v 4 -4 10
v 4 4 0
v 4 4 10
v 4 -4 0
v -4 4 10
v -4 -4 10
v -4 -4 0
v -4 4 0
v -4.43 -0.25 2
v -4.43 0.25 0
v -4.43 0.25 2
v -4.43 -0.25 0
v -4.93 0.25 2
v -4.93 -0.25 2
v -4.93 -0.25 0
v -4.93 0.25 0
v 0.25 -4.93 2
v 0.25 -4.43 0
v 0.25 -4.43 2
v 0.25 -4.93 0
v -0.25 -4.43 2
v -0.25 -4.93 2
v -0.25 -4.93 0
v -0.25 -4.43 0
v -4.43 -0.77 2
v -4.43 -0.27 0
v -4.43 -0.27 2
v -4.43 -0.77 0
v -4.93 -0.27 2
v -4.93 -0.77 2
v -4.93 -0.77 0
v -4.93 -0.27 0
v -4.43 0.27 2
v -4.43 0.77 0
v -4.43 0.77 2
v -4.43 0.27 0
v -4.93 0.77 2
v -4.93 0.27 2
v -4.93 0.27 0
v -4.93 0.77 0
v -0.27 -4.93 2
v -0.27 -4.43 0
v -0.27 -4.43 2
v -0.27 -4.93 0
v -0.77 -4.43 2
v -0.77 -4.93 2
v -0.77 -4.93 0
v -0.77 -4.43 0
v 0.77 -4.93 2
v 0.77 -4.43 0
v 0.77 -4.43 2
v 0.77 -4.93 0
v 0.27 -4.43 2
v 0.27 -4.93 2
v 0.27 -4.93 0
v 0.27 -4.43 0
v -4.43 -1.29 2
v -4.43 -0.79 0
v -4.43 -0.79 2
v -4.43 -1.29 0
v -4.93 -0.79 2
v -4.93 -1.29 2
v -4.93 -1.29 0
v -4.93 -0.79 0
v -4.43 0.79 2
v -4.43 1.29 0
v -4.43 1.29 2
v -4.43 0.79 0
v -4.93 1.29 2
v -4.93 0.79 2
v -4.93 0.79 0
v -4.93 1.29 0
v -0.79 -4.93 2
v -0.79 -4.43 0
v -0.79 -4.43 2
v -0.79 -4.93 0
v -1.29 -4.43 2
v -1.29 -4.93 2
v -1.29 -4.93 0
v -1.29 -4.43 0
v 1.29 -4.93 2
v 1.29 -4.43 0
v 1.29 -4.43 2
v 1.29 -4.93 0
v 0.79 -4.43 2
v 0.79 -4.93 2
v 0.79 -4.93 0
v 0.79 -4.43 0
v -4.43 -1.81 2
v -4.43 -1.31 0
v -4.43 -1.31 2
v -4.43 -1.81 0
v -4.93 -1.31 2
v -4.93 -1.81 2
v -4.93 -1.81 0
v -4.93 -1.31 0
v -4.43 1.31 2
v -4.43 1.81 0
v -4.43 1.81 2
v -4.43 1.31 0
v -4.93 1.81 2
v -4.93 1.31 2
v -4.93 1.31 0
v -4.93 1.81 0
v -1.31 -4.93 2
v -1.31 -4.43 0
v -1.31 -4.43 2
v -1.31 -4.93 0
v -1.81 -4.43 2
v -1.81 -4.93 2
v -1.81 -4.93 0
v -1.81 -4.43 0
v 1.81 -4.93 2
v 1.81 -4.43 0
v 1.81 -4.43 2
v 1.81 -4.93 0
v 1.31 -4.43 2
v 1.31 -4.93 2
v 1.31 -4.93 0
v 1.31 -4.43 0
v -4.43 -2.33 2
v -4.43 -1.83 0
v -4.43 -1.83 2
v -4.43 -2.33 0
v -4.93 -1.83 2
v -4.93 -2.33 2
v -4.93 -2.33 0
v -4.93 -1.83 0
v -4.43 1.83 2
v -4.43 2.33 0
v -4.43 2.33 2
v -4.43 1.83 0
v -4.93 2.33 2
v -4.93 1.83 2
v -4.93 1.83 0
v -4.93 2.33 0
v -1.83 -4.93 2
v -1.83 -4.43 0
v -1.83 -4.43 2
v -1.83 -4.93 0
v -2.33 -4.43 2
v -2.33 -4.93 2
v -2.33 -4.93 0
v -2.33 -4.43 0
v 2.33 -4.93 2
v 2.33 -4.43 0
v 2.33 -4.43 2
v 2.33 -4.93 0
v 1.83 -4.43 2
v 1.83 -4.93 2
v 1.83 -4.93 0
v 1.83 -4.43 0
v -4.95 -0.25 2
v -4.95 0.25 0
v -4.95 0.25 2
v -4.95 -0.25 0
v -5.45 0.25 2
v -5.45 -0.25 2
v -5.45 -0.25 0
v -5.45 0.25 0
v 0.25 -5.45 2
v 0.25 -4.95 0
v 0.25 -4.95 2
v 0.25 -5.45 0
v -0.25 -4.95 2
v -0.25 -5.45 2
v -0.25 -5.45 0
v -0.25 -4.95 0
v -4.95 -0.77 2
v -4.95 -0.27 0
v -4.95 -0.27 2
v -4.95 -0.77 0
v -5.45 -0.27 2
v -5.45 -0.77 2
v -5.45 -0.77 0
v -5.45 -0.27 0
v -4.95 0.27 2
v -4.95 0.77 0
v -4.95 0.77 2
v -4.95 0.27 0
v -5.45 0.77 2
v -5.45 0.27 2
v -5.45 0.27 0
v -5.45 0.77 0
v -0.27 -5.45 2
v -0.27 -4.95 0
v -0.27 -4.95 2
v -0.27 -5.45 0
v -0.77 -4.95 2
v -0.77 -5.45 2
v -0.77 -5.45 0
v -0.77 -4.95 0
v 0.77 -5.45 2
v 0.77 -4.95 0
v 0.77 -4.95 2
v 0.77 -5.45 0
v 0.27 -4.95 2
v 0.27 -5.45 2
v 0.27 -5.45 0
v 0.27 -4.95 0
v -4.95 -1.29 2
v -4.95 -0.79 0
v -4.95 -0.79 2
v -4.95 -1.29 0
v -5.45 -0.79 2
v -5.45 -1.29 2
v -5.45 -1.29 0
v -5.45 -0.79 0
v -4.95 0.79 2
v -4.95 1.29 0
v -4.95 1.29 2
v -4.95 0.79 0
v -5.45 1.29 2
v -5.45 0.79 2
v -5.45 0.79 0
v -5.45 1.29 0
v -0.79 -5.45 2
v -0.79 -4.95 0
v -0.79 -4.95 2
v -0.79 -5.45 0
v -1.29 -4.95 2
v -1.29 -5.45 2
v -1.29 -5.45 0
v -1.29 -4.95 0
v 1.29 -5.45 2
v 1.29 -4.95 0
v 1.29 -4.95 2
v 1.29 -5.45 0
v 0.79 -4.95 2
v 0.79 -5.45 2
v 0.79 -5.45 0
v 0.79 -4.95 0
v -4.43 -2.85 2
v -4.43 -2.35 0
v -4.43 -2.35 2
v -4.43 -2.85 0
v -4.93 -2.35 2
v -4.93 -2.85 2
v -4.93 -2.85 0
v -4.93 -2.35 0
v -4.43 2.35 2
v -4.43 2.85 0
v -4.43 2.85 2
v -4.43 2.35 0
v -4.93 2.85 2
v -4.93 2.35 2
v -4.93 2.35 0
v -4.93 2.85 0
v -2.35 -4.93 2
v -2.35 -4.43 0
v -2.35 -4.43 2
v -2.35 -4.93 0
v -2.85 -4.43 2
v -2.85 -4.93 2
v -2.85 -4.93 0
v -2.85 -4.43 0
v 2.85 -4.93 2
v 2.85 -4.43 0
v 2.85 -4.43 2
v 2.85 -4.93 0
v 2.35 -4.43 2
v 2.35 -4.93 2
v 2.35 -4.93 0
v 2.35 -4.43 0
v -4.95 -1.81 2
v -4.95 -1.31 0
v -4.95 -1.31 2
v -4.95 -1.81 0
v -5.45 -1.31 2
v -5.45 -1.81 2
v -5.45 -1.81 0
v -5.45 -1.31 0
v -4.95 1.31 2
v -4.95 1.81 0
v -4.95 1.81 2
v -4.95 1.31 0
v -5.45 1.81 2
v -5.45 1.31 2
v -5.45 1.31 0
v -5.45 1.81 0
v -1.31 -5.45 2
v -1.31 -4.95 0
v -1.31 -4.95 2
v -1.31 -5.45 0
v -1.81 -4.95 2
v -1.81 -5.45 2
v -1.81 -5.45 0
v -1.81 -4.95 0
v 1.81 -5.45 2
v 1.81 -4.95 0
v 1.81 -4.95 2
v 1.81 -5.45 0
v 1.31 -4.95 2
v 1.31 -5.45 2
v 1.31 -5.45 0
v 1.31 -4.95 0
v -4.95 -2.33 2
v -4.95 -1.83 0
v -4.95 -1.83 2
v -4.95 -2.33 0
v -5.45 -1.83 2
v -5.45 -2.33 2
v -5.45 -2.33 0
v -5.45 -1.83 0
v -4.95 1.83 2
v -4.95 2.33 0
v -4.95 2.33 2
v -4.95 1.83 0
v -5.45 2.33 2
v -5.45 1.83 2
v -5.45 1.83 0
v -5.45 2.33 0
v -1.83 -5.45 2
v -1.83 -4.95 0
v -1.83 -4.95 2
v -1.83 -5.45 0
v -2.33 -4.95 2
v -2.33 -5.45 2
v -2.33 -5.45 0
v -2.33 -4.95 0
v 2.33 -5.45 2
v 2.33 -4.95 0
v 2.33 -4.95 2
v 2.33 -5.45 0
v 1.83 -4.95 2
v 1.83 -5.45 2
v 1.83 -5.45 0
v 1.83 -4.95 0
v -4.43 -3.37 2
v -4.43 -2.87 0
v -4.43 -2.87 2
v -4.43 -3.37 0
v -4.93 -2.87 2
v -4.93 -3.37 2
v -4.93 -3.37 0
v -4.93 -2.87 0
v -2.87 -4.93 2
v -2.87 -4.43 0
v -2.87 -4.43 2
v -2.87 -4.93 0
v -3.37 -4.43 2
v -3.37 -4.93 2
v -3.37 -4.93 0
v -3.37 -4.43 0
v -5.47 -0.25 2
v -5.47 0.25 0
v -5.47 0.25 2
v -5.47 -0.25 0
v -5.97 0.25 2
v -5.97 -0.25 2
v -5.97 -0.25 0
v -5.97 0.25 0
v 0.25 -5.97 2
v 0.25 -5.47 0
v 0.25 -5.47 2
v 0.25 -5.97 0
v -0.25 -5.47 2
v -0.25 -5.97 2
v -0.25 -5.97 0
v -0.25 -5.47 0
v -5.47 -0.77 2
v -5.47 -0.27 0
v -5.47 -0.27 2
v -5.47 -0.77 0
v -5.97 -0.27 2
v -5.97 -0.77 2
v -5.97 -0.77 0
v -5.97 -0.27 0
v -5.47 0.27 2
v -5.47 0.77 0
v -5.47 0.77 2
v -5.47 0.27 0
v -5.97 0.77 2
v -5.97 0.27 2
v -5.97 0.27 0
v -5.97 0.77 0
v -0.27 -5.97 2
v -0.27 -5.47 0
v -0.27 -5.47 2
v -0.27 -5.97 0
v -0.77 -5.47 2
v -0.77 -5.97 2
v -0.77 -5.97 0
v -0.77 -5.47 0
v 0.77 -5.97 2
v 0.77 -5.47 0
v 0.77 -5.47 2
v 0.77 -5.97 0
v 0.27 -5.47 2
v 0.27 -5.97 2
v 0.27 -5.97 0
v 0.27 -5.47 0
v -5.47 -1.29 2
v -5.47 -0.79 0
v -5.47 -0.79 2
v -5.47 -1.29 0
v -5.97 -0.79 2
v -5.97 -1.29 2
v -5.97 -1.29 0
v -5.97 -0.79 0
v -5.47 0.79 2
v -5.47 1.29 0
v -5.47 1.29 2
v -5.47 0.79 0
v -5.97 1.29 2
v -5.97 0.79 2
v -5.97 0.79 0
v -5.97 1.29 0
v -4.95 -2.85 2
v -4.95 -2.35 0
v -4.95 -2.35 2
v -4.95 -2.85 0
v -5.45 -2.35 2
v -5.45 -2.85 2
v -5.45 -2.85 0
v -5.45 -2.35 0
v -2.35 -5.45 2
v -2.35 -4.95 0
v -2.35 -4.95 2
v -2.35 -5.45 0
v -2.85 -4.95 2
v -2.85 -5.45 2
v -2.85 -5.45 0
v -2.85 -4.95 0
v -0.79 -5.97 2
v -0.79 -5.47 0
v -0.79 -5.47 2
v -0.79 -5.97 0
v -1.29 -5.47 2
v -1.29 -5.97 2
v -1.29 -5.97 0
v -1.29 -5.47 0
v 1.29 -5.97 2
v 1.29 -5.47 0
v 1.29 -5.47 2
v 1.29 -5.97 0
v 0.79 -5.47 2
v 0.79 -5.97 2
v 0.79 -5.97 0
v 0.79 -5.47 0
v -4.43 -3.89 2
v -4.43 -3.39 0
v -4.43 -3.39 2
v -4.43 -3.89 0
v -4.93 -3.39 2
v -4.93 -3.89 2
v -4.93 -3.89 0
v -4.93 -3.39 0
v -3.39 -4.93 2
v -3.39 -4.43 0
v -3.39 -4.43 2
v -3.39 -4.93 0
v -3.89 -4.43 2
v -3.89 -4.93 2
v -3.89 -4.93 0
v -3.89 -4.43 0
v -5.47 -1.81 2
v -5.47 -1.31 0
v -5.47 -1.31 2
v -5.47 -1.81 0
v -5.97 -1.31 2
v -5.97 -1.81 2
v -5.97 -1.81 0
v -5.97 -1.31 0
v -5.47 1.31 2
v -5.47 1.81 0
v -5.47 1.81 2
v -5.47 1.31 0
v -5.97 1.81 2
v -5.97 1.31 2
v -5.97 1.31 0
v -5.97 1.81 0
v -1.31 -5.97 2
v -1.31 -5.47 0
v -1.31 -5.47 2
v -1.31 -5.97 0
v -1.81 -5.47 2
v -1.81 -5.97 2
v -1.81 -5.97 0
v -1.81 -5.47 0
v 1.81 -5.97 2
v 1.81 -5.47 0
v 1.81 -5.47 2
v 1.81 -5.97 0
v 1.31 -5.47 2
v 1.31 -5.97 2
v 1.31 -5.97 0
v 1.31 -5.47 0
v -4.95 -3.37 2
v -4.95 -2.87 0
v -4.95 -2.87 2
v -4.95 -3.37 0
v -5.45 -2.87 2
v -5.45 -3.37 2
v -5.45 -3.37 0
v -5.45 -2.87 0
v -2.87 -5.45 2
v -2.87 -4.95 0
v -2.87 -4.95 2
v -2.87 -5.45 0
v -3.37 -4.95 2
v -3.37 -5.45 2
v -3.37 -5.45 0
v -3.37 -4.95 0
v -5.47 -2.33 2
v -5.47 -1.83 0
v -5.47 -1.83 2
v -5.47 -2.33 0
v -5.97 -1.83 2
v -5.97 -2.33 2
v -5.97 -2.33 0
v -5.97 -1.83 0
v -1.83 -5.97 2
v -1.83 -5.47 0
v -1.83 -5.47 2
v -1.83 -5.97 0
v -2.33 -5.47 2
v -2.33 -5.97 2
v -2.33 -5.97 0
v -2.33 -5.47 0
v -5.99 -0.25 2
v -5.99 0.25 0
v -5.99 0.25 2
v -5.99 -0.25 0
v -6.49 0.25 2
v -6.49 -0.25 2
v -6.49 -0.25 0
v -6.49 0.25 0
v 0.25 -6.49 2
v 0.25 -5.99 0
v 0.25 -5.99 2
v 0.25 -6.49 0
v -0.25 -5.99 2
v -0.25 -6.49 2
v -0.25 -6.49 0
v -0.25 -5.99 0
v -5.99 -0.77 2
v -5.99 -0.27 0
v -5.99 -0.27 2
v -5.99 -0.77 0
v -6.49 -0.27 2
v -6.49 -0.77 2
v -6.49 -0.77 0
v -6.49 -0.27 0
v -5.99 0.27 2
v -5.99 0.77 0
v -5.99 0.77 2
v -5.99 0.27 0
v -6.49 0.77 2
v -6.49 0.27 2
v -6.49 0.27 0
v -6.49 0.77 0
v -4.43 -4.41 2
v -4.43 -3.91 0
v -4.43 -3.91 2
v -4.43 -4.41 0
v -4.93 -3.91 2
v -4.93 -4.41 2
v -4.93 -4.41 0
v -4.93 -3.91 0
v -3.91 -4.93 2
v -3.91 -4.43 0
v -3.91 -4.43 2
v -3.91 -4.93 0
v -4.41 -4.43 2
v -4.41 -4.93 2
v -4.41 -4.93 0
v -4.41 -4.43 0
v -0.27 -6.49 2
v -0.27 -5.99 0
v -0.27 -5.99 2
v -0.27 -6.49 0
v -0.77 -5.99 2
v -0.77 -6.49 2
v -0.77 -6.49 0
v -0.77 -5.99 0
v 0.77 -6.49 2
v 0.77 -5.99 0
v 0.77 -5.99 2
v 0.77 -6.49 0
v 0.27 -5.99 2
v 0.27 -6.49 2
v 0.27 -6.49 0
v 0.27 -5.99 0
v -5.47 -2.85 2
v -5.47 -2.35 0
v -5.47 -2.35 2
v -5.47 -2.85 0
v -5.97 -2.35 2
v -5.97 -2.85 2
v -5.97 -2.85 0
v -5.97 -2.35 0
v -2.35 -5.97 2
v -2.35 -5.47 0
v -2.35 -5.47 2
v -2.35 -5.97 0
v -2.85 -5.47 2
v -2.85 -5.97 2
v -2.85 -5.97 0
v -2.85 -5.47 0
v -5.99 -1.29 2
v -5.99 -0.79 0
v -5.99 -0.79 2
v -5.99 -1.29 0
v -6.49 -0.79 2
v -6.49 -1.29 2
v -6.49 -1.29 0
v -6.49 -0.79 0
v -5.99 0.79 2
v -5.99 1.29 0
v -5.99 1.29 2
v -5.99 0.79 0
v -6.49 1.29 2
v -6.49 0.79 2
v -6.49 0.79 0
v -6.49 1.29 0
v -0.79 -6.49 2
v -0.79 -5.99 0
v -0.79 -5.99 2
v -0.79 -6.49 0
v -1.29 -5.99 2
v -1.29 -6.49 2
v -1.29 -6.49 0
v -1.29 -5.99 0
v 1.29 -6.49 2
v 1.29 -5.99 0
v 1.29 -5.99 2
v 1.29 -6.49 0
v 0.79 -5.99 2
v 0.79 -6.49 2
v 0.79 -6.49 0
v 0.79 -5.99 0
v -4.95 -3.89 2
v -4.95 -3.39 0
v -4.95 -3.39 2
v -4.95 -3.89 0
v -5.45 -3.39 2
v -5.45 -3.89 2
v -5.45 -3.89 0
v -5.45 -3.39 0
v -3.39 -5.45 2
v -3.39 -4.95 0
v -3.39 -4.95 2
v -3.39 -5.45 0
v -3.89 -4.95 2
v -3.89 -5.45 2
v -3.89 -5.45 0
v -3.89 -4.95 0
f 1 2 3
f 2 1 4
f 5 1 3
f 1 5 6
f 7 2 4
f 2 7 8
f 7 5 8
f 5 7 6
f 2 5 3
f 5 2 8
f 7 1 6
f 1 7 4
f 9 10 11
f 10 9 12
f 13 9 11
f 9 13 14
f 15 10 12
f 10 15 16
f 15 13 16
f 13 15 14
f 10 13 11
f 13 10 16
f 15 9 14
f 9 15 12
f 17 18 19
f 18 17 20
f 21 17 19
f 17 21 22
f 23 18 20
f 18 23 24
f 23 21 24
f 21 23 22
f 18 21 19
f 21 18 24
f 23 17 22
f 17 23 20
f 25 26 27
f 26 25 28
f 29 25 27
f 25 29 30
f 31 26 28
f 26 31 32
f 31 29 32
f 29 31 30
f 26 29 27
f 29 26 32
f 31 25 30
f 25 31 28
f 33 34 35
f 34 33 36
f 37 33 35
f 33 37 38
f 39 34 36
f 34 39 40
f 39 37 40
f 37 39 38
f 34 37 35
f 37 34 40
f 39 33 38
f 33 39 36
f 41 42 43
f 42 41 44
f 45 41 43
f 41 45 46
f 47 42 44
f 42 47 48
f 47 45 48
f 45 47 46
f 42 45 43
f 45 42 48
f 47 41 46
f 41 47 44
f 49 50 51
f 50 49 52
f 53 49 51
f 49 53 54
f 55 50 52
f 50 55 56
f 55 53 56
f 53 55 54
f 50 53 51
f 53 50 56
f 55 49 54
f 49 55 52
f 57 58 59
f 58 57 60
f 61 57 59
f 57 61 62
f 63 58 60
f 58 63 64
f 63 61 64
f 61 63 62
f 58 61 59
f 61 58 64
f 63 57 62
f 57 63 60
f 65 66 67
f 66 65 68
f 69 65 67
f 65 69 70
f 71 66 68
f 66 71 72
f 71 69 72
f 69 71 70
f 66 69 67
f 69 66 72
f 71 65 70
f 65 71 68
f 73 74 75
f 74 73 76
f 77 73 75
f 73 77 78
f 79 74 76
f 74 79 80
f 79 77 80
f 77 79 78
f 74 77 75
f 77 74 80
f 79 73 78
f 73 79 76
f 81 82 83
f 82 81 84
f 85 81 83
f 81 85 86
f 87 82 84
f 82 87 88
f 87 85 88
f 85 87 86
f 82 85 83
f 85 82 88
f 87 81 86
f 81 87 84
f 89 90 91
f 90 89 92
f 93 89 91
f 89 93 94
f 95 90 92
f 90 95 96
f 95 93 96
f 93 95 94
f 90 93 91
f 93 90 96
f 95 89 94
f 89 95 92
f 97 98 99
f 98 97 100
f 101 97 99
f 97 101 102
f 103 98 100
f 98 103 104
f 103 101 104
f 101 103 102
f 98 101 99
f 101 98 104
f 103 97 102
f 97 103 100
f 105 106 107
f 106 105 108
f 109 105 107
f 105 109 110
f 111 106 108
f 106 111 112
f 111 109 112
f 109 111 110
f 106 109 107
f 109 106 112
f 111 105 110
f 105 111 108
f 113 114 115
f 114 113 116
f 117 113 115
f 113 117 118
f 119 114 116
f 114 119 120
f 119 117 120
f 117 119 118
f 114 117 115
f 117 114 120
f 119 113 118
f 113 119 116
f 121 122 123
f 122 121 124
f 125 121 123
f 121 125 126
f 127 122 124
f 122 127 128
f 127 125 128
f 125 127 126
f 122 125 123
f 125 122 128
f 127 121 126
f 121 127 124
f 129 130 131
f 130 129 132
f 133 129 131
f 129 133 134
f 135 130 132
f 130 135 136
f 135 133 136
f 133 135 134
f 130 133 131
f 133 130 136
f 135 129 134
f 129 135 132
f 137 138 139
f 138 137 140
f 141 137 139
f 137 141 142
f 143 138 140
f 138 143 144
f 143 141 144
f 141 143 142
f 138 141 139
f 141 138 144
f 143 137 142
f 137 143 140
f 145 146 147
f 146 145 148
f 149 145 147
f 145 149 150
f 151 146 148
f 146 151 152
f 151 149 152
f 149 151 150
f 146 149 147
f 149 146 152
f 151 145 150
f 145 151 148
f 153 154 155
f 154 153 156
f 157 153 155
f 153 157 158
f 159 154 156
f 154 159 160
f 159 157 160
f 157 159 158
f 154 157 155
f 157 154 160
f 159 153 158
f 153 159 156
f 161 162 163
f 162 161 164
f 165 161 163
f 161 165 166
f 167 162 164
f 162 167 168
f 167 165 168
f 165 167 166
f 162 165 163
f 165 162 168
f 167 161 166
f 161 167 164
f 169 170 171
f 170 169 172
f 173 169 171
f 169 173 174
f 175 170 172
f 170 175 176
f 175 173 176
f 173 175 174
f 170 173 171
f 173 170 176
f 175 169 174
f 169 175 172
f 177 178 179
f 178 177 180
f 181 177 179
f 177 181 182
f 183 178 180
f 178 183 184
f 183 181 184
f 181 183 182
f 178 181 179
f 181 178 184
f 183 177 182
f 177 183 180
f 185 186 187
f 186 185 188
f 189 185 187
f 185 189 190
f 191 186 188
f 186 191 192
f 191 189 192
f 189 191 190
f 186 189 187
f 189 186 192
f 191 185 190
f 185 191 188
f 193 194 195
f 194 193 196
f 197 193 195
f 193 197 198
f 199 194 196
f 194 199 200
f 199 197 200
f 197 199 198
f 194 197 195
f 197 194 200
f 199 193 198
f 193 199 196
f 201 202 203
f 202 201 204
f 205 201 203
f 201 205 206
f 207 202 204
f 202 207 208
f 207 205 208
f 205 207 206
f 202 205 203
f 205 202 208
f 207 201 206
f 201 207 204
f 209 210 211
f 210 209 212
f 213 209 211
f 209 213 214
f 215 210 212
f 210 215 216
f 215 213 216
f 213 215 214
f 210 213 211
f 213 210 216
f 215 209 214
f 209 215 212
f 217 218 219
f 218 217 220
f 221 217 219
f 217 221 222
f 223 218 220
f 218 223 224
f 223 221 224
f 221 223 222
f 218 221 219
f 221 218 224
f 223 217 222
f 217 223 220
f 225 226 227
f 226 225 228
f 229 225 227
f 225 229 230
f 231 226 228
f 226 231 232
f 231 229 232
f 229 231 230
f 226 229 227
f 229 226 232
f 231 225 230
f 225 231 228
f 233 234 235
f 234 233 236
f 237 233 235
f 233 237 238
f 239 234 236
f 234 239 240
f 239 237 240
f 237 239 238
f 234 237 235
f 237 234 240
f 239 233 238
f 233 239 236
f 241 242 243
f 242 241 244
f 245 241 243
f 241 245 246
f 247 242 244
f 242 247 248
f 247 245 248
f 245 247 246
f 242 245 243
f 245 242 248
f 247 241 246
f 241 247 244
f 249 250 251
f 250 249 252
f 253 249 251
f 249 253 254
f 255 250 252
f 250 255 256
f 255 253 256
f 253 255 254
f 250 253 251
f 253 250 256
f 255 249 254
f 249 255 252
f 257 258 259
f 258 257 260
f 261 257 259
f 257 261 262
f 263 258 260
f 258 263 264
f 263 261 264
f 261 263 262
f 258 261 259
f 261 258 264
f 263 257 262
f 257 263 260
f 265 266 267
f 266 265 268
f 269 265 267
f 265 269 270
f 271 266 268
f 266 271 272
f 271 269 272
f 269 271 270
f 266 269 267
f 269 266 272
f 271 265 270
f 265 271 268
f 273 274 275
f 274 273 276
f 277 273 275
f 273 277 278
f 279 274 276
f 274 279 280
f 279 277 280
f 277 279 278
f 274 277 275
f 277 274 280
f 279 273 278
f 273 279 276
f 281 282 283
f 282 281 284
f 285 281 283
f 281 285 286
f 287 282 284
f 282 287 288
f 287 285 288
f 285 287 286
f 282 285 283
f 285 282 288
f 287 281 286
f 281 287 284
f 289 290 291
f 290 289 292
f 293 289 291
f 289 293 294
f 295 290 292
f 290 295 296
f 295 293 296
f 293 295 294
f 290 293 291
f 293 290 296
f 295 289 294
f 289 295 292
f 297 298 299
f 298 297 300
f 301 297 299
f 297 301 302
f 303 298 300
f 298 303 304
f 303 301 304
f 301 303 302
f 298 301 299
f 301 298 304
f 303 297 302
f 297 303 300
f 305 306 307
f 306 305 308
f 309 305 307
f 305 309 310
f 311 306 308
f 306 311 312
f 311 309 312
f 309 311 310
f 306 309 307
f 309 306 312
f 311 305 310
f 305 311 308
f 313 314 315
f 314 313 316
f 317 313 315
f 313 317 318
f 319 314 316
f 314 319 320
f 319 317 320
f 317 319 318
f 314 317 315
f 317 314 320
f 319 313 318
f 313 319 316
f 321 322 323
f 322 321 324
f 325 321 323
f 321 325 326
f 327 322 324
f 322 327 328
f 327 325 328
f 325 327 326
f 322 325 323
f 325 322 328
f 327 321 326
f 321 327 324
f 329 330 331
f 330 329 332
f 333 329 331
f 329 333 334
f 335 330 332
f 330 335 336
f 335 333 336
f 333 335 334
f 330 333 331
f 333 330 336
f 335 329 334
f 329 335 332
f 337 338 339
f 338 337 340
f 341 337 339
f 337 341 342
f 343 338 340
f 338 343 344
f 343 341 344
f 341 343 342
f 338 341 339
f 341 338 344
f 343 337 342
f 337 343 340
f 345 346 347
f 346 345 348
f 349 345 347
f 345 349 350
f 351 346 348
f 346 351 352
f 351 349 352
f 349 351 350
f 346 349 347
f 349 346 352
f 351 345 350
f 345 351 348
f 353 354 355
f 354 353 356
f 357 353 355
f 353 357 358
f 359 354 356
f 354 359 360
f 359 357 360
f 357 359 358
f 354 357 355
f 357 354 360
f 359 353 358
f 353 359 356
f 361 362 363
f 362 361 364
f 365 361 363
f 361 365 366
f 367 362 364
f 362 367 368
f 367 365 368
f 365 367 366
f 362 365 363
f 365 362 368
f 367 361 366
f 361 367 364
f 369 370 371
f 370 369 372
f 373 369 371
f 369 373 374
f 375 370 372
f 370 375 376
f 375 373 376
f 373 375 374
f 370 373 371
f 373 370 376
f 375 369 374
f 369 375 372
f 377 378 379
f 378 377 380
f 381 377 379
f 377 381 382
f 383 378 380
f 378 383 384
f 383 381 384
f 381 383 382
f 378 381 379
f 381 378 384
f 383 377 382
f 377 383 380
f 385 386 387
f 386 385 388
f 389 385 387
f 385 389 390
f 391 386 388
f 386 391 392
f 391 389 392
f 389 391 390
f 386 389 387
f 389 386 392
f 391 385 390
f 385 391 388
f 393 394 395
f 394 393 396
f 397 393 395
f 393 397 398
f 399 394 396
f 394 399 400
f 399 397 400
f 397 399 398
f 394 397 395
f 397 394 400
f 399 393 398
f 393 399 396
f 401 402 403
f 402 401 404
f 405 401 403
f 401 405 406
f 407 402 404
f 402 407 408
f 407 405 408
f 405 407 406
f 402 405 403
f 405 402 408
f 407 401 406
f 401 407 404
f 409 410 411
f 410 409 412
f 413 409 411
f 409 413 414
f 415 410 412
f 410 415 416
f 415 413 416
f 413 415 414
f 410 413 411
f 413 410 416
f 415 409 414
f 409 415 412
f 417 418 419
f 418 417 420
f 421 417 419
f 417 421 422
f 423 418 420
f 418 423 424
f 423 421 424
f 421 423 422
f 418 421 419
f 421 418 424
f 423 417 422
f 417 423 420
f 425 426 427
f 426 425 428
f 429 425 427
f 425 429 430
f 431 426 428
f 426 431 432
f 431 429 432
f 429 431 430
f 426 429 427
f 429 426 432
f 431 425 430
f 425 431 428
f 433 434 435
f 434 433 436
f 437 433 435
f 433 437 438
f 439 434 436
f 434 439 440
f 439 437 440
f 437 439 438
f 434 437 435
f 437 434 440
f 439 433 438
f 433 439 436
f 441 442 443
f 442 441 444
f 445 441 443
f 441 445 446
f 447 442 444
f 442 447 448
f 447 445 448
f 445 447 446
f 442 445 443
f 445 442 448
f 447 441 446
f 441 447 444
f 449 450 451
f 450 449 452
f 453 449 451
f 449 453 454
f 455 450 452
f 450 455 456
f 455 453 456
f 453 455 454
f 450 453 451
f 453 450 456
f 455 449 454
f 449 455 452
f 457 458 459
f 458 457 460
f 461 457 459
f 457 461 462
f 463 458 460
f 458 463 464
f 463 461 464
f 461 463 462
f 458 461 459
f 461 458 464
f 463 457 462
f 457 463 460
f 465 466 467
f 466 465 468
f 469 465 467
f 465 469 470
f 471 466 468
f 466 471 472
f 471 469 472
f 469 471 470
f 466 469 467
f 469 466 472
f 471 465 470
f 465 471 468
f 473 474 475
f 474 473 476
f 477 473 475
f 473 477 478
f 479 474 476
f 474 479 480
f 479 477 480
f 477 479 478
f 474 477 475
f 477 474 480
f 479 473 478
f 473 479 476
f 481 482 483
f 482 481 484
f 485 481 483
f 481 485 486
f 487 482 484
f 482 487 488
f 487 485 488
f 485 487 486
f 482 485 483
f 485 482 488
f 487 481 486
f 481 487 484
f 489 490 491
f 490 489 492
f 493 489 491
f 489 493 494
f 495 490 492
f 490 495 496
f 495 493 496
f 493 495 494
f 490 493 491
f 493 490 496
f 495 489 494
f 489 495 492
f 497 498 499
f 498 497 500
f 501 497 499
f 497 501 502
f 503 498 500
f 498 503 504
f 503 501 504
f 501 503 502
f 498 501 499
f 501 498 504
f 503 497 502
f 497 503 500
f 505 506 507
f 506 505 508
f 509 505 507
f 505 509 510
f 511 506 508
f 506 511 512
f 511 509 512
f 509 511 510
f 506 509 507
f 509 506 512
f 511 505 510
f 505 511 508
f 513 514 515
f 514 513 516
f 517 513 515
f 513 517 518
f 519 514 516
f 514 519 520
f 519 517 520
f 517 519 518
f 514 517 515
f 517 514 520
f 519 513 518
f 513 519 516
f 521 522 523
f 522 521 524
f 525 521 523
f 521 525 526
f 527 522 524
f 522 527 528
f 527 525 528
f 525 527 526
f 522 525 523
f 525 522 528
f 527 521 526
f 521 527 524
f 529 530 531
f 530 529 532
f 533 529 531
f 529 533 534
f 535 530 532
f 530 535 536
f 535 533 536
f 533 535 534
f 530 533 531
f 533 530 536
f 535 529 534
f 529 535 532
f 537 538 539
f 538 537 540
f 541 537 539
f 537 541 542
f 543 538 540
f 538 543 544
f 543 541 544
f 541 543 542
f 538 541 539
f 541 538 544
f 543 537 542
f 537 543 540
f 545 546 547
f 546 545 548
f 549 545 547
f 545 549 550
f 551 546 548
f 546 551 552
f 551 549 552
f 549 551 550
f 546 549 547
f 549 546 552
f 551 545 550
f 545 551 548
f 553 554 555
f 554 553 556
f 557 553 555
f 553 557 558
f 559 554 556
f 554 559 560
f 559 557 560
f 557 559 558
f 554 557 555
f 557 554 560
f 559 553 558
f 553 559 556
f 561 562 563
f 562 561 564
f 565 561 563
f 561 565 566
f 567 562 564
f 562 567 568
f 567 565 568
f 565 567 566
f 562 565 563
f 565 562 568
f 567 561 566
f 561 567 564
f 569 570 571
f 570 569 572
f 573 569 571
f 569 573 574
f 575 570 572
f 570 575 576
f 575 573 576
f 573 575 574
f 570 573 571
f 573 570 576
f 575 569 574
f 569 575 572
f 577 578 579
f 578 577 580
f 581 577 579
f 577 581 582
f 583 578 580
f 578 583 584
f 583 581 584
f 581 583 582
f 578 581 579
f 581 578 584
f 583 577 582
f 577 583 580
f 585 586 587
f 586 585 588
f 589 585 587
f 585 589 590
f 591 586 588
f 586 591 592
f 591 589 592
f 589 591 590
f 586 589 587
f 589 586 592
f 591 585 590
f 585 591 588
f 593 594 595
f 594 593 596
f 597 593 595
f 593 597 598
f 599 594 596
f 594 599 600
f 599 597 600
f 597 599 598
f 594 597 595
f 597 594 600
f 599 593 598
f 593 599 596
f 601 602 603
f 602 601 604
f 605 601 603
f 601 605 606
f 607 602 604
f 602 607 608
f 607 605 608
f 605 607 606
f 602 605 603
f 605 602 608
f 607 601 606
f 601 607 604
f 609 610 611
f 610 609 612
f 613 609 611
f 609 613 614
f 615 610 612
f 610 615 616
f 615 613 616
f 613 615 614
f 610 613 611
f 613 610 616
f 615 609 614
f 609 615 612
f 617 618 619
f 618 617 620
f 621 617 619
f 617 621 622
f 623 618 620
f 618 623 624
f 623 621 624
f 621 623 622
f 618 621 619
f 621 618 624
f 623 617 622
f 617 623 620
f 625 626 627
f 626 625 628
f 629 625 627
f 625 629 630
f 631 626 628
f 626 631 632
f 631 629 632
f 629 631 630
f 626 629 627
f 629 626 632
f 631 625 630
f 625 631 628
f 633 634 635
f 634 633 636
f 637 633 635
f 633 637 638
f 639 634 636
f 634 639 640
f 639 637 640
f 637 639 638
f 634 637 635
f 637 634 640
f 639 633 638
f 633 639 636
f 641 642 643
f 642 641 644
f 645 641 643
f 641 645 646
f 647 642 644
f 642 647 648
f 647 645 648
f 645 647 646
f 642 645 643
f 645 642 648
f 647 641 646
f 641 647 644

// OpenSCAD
translate([0, 0, 5]) color([0,1,0,0.9]) cube([8, 8, 10], center=true);
translate([-4.68, 0.0, 1]) color([1,0,0]) cube([0.5, 0.5, 2], center=true);
translate([0.0, -4.68, 1]) color([1,0,0]) cube([0.5, 0.5, 2], center=true);
translate([-4.68, -0.52, 1]) color([1,0,0]) cube([0.5, 0.5, 2], center=true);
translate([-4.68, 0.52, 1]) color([1,0,0]) cube([0.5, 0.5, 2], center=true);
translate([-0.52, -4.68, 1]) color([1,0,0]) cube([0.5, 0.5, 2], center=true);
translate([0.52, -4.68, 1]) color([1,0,0]) cube([0.5, 0.5, 2], center=true);
translate([-4.68, -1.04, 1]) color([1,0,0]) cube([0.5, 0.5, 2], center=true);
translate([-4.68, 1.04, 1]) color([1,0,0]) cube([0.5, 0.5, 2], center=true);
translate([-1.04, -4.68, 1]) color([1,0,0]) cube([0.5, 0.5, 2], center=true);
translate([1.04, -4.68, 1]) color([1,0,0]) cube([0.5, 0.5, 2], center=true);
translate([-4.68, -1.56, 1]) color([1,0,0]) cube([0.5, 0.5, 2], center=true);
translate([-4.68, 1.56, 1]) color([1,0,0]) cube([0.5, 0.5, 2], center=true);
translate([-1.56, -4.68, 1]) color([1,0,0]) cube([0.5, 0.5, 2], center=true);
translate([1.56, -4.68, 1]) color([1,0,0]) cube([0.5, 0.5, 2], center=true);
translate([-4.68, -2.08, 1]) color([1,0,0]) cube([0.5, 0.5, 2], center=true);
translate([-4.68, 2.08, 1]) color([1,0,0]) cube([0.5, 0.5, 2], center=true);
translate([-2.08, -4.68, 1]) color([1,0,0]) cube([0.5, 0.5, 2], center=true);
translate([2.08, -4.68, 1]) color([1,0,0]) cube([0.5, 0.5, 2], center=true);
translate([-5.2, 0.0, 1]) color([1,0,0]) cube([0.5, 0.5, 2], center=true);
translate([0.0, -5.2, 1]) color([1,0,0]) cube([0.5, 0.5, 2], center=true);
translate([-5.2, -0.52, 1]) color([1,0,0]) cube([0.5, 0.5, 2], center=true);
translate([-5.2, 0.52, 1]) color([1,0,0]) cube([0.5, 0.5, 2], center=true);
translate([-0.52, -5.2, 1]) color([1,0,0]) cube([0.5, 0.5, 2], center=true);
translate([0.52, -5.2, 1]) color([1,0,0]) cube([0.5, 0.5, 2], center=true);
translate([-5.2, -1.04, 1]) color([1,0,0]) cube([0.5, 0.5, 2], center=true);
translate([-5.2, 1.04, 1]) color([1,0,0]) cube([0.5, 0.5, 2], center=true);
translate([-1.04, -5.2, 1]) color([1,0,0]) cube([0.5, 0.5, 2], center=true);
translate([1.04, -5.2, 1]) color([1,0,0]) cube([0.5, 0.5, 2], center=true);
translate([-4.68, -2.6, 1]) color([1,0,0]) cube([0.5, 0.5, 2], center=true);
translate([-4.68, 2.6, 1]) color([1,0,0]) cube([0.5, 0.5, 2], center=true);
translate([-2.6, -4.68, 1]) color([1,0,0]) cube([0.5, 0.5, 2], center=true);
translate([2.6, -4.68, 1]) color([1,0,0]) cube([0.5, 0.5, 2], center=true);
translate([-5.2, -1.56, 1]) color([1,0,0]) cube([0.5, 0.5, 2], center=true);
translate([-5.2, 1.56, 1]) color([1,0,0]) cube([0.5, 0.5, 2], center=true);
translate([-1.56, -5.2, 1]) color([1,0,0]) cube([0.5, 0.5, 2], center=true);
translate([1.56, -5.2, 1]) color([1,0,0]) cube([0.5, 0.5, 2], center=true);
translate([-5.2, -2.08, 1]) color([1,0,0]) cube([0.5, 0.5, 2], center=true);
translate([-5.2, 2.08, 1]) color([1,0,0]) cube([0.5, 0.5, 2], center=true);
translate([-2.08, -5.2, 1]) color([1,0,0]) cube([0.5, 0.5, 2], center=true);
translate([2.08, -5.2, 1]) color([1,0,0]) cube([0.5, 0.5, 2], center=true);
translate([-4.68, -3.12, 1]) color([1,0,0]) cube([0.5, 0.5, 2], center=true);
translate([-3.12, -4.68, 1]) color([1,0,0]) cube([0.5, 0.5, 2], center=true);
translate([-5.72, 0.0, 1]) color([1,0,0]) cube([0.5, 0.5, 2], center=true);
translate([0.0, -5.72, 1]) color([1,0,0]) cube([0.5, 0.5, 2], center=true);
translate([-5.72, -0.52, 1]) color([1,0,0]) cube([0.5, 0.5, 2], center=true);
translate([-5.72, 0.52, 1]) color([1,0,0]) cube([0.5, 0.5, 2], center=true);
translate([-0.52, -5.72, 1]) color([1,0,0]) cube([0.5, 0.5, 2], center=true);
translate([0.52, -5.72, 1]) color([1,0,0]) cube([0.5, 0.5, 2], center=true);
translate([-5.72, -1.04, 1]) color([1,0,0]) cube([0.5, 0.5, 2], center=true);
translate([-5.72, 1.04, 1]) color([1,0,0]) cube([0.5, 0.5, 2], center=true);
translate([-5.2, -2.6, 1]) color([1,0,0]) cube([0.5, 0.5, 2], center=true);
translate([-2.6, -5.2, 1]) color([1,0,0]) cube([0.5, 0.5, 2], center=true);
translate([-1.04, -5.72, 1]) color([1,0,0]) cube([0.5, 0.5, 2], center=true);
translate([1.04, -5.72, 1]) color([1,0,0]) cube([0.5, 0.5, 2], center=true);
translate([-4.68, -3.64, 1]) color([1,0,0]) cube([0.5, 0.5, 2], center=true);
translate([-3.64, -4.68, 1]) color([1,0,0]) cube([0.5, 0.5, 2], center=true);
translate([-5.72, -1.56, 1]) color([1,0,0]) cube([0.5, 0.5, 2], center=true);
translate([-5.72, 1.56, 1]) color([1,0,0]) cube([0.5, 0.5, 2], center=true);
translate([-1.56, -5.72, 1]) color([1,0,0]) cube([0.5, 0.5, 2], center=true);
translate([1.56, -5.72, 1]) color([1,0,0]) cube([0.5, 0.5, 2], center=true);
translate([-5.2, -3.12, 1]) color([1,0,0]) cube([0.5, 0.5, 2], center=true);
translate([-3.12, -5.2, 1]) color([1,0,0]) cube([0.5, 0.5, 2], center=true);
translate([-5.72, -2.08, 1]) color([1,0,0]) cube([0.5, 0.5, 2], center=true);
translate([-2.08, -5.72, 1]) color([1,0,0]) cube([0.5, 0.5, 2], center=true);
translate([-6.24, 0.0, 1]) color([1,0,0]) cube([0.5, 0.5, 2], center=true);
translate([0.0, -6.24, 1]) color([1,0,0]) cube([0.5, 0.5, 2], center=true);
translate([-6.24, -0.52, 1]) color([1,0,0]) cube([0.5, 0.5, 2], center=true);
translate([-6.24, 0.52, 1]) color([1,0,0]) cube([0.5, 0.5, 2], center=true);
translate([-4.68, -4.16, 1]) color([1,0,0]) cube([0.5, 0.5, 2], center=true);
translate([-4.16, -4.68, 1]) color([1,0,0]) cube([0.5, 0.5, 2], center=true);
translate([-0.52, -6.24, 1]) color([1,0,0]) cube([0.5, 0.5, 2], center=true);
translate([0.52, -6.24, 1]) color([1,0,0]) cube([0.5, 0.5, 2], center=true);
translate([-5.72, -2.6, 1]) color([1,0,0]) cube([0.5, 0.5, 2], center=true);
translate([-2.6, -5.72, 1]) color([1,0,0]) cube([0.5, 0.5, 2], center=true);
translate([-6.24, -1.04, 1]) color([1,0,0]) cube([0.5, 0.5, 2], center=true);
translate([-6.24, 1.04, 1]) color([1,0,0]) cube([0.5, 0.5, 2], center=true);
translate([-1.04, -6.24, 1]) color([1,0,0]) cube([0.5, 0.5, 2], center=true);
translate([1.04, -6.24, 1]) color([1,0,0]) cube([0.5, 0.5, 2], center=true);
translate([-5.2, -3.64, 1]) color([1,0,0]) cube([0.5, 0.5, 2], center=true);
translate([-3.64, -5.2, 1]) color([1,0,0]) cube([0.5, 0.5, 2], center=true);
